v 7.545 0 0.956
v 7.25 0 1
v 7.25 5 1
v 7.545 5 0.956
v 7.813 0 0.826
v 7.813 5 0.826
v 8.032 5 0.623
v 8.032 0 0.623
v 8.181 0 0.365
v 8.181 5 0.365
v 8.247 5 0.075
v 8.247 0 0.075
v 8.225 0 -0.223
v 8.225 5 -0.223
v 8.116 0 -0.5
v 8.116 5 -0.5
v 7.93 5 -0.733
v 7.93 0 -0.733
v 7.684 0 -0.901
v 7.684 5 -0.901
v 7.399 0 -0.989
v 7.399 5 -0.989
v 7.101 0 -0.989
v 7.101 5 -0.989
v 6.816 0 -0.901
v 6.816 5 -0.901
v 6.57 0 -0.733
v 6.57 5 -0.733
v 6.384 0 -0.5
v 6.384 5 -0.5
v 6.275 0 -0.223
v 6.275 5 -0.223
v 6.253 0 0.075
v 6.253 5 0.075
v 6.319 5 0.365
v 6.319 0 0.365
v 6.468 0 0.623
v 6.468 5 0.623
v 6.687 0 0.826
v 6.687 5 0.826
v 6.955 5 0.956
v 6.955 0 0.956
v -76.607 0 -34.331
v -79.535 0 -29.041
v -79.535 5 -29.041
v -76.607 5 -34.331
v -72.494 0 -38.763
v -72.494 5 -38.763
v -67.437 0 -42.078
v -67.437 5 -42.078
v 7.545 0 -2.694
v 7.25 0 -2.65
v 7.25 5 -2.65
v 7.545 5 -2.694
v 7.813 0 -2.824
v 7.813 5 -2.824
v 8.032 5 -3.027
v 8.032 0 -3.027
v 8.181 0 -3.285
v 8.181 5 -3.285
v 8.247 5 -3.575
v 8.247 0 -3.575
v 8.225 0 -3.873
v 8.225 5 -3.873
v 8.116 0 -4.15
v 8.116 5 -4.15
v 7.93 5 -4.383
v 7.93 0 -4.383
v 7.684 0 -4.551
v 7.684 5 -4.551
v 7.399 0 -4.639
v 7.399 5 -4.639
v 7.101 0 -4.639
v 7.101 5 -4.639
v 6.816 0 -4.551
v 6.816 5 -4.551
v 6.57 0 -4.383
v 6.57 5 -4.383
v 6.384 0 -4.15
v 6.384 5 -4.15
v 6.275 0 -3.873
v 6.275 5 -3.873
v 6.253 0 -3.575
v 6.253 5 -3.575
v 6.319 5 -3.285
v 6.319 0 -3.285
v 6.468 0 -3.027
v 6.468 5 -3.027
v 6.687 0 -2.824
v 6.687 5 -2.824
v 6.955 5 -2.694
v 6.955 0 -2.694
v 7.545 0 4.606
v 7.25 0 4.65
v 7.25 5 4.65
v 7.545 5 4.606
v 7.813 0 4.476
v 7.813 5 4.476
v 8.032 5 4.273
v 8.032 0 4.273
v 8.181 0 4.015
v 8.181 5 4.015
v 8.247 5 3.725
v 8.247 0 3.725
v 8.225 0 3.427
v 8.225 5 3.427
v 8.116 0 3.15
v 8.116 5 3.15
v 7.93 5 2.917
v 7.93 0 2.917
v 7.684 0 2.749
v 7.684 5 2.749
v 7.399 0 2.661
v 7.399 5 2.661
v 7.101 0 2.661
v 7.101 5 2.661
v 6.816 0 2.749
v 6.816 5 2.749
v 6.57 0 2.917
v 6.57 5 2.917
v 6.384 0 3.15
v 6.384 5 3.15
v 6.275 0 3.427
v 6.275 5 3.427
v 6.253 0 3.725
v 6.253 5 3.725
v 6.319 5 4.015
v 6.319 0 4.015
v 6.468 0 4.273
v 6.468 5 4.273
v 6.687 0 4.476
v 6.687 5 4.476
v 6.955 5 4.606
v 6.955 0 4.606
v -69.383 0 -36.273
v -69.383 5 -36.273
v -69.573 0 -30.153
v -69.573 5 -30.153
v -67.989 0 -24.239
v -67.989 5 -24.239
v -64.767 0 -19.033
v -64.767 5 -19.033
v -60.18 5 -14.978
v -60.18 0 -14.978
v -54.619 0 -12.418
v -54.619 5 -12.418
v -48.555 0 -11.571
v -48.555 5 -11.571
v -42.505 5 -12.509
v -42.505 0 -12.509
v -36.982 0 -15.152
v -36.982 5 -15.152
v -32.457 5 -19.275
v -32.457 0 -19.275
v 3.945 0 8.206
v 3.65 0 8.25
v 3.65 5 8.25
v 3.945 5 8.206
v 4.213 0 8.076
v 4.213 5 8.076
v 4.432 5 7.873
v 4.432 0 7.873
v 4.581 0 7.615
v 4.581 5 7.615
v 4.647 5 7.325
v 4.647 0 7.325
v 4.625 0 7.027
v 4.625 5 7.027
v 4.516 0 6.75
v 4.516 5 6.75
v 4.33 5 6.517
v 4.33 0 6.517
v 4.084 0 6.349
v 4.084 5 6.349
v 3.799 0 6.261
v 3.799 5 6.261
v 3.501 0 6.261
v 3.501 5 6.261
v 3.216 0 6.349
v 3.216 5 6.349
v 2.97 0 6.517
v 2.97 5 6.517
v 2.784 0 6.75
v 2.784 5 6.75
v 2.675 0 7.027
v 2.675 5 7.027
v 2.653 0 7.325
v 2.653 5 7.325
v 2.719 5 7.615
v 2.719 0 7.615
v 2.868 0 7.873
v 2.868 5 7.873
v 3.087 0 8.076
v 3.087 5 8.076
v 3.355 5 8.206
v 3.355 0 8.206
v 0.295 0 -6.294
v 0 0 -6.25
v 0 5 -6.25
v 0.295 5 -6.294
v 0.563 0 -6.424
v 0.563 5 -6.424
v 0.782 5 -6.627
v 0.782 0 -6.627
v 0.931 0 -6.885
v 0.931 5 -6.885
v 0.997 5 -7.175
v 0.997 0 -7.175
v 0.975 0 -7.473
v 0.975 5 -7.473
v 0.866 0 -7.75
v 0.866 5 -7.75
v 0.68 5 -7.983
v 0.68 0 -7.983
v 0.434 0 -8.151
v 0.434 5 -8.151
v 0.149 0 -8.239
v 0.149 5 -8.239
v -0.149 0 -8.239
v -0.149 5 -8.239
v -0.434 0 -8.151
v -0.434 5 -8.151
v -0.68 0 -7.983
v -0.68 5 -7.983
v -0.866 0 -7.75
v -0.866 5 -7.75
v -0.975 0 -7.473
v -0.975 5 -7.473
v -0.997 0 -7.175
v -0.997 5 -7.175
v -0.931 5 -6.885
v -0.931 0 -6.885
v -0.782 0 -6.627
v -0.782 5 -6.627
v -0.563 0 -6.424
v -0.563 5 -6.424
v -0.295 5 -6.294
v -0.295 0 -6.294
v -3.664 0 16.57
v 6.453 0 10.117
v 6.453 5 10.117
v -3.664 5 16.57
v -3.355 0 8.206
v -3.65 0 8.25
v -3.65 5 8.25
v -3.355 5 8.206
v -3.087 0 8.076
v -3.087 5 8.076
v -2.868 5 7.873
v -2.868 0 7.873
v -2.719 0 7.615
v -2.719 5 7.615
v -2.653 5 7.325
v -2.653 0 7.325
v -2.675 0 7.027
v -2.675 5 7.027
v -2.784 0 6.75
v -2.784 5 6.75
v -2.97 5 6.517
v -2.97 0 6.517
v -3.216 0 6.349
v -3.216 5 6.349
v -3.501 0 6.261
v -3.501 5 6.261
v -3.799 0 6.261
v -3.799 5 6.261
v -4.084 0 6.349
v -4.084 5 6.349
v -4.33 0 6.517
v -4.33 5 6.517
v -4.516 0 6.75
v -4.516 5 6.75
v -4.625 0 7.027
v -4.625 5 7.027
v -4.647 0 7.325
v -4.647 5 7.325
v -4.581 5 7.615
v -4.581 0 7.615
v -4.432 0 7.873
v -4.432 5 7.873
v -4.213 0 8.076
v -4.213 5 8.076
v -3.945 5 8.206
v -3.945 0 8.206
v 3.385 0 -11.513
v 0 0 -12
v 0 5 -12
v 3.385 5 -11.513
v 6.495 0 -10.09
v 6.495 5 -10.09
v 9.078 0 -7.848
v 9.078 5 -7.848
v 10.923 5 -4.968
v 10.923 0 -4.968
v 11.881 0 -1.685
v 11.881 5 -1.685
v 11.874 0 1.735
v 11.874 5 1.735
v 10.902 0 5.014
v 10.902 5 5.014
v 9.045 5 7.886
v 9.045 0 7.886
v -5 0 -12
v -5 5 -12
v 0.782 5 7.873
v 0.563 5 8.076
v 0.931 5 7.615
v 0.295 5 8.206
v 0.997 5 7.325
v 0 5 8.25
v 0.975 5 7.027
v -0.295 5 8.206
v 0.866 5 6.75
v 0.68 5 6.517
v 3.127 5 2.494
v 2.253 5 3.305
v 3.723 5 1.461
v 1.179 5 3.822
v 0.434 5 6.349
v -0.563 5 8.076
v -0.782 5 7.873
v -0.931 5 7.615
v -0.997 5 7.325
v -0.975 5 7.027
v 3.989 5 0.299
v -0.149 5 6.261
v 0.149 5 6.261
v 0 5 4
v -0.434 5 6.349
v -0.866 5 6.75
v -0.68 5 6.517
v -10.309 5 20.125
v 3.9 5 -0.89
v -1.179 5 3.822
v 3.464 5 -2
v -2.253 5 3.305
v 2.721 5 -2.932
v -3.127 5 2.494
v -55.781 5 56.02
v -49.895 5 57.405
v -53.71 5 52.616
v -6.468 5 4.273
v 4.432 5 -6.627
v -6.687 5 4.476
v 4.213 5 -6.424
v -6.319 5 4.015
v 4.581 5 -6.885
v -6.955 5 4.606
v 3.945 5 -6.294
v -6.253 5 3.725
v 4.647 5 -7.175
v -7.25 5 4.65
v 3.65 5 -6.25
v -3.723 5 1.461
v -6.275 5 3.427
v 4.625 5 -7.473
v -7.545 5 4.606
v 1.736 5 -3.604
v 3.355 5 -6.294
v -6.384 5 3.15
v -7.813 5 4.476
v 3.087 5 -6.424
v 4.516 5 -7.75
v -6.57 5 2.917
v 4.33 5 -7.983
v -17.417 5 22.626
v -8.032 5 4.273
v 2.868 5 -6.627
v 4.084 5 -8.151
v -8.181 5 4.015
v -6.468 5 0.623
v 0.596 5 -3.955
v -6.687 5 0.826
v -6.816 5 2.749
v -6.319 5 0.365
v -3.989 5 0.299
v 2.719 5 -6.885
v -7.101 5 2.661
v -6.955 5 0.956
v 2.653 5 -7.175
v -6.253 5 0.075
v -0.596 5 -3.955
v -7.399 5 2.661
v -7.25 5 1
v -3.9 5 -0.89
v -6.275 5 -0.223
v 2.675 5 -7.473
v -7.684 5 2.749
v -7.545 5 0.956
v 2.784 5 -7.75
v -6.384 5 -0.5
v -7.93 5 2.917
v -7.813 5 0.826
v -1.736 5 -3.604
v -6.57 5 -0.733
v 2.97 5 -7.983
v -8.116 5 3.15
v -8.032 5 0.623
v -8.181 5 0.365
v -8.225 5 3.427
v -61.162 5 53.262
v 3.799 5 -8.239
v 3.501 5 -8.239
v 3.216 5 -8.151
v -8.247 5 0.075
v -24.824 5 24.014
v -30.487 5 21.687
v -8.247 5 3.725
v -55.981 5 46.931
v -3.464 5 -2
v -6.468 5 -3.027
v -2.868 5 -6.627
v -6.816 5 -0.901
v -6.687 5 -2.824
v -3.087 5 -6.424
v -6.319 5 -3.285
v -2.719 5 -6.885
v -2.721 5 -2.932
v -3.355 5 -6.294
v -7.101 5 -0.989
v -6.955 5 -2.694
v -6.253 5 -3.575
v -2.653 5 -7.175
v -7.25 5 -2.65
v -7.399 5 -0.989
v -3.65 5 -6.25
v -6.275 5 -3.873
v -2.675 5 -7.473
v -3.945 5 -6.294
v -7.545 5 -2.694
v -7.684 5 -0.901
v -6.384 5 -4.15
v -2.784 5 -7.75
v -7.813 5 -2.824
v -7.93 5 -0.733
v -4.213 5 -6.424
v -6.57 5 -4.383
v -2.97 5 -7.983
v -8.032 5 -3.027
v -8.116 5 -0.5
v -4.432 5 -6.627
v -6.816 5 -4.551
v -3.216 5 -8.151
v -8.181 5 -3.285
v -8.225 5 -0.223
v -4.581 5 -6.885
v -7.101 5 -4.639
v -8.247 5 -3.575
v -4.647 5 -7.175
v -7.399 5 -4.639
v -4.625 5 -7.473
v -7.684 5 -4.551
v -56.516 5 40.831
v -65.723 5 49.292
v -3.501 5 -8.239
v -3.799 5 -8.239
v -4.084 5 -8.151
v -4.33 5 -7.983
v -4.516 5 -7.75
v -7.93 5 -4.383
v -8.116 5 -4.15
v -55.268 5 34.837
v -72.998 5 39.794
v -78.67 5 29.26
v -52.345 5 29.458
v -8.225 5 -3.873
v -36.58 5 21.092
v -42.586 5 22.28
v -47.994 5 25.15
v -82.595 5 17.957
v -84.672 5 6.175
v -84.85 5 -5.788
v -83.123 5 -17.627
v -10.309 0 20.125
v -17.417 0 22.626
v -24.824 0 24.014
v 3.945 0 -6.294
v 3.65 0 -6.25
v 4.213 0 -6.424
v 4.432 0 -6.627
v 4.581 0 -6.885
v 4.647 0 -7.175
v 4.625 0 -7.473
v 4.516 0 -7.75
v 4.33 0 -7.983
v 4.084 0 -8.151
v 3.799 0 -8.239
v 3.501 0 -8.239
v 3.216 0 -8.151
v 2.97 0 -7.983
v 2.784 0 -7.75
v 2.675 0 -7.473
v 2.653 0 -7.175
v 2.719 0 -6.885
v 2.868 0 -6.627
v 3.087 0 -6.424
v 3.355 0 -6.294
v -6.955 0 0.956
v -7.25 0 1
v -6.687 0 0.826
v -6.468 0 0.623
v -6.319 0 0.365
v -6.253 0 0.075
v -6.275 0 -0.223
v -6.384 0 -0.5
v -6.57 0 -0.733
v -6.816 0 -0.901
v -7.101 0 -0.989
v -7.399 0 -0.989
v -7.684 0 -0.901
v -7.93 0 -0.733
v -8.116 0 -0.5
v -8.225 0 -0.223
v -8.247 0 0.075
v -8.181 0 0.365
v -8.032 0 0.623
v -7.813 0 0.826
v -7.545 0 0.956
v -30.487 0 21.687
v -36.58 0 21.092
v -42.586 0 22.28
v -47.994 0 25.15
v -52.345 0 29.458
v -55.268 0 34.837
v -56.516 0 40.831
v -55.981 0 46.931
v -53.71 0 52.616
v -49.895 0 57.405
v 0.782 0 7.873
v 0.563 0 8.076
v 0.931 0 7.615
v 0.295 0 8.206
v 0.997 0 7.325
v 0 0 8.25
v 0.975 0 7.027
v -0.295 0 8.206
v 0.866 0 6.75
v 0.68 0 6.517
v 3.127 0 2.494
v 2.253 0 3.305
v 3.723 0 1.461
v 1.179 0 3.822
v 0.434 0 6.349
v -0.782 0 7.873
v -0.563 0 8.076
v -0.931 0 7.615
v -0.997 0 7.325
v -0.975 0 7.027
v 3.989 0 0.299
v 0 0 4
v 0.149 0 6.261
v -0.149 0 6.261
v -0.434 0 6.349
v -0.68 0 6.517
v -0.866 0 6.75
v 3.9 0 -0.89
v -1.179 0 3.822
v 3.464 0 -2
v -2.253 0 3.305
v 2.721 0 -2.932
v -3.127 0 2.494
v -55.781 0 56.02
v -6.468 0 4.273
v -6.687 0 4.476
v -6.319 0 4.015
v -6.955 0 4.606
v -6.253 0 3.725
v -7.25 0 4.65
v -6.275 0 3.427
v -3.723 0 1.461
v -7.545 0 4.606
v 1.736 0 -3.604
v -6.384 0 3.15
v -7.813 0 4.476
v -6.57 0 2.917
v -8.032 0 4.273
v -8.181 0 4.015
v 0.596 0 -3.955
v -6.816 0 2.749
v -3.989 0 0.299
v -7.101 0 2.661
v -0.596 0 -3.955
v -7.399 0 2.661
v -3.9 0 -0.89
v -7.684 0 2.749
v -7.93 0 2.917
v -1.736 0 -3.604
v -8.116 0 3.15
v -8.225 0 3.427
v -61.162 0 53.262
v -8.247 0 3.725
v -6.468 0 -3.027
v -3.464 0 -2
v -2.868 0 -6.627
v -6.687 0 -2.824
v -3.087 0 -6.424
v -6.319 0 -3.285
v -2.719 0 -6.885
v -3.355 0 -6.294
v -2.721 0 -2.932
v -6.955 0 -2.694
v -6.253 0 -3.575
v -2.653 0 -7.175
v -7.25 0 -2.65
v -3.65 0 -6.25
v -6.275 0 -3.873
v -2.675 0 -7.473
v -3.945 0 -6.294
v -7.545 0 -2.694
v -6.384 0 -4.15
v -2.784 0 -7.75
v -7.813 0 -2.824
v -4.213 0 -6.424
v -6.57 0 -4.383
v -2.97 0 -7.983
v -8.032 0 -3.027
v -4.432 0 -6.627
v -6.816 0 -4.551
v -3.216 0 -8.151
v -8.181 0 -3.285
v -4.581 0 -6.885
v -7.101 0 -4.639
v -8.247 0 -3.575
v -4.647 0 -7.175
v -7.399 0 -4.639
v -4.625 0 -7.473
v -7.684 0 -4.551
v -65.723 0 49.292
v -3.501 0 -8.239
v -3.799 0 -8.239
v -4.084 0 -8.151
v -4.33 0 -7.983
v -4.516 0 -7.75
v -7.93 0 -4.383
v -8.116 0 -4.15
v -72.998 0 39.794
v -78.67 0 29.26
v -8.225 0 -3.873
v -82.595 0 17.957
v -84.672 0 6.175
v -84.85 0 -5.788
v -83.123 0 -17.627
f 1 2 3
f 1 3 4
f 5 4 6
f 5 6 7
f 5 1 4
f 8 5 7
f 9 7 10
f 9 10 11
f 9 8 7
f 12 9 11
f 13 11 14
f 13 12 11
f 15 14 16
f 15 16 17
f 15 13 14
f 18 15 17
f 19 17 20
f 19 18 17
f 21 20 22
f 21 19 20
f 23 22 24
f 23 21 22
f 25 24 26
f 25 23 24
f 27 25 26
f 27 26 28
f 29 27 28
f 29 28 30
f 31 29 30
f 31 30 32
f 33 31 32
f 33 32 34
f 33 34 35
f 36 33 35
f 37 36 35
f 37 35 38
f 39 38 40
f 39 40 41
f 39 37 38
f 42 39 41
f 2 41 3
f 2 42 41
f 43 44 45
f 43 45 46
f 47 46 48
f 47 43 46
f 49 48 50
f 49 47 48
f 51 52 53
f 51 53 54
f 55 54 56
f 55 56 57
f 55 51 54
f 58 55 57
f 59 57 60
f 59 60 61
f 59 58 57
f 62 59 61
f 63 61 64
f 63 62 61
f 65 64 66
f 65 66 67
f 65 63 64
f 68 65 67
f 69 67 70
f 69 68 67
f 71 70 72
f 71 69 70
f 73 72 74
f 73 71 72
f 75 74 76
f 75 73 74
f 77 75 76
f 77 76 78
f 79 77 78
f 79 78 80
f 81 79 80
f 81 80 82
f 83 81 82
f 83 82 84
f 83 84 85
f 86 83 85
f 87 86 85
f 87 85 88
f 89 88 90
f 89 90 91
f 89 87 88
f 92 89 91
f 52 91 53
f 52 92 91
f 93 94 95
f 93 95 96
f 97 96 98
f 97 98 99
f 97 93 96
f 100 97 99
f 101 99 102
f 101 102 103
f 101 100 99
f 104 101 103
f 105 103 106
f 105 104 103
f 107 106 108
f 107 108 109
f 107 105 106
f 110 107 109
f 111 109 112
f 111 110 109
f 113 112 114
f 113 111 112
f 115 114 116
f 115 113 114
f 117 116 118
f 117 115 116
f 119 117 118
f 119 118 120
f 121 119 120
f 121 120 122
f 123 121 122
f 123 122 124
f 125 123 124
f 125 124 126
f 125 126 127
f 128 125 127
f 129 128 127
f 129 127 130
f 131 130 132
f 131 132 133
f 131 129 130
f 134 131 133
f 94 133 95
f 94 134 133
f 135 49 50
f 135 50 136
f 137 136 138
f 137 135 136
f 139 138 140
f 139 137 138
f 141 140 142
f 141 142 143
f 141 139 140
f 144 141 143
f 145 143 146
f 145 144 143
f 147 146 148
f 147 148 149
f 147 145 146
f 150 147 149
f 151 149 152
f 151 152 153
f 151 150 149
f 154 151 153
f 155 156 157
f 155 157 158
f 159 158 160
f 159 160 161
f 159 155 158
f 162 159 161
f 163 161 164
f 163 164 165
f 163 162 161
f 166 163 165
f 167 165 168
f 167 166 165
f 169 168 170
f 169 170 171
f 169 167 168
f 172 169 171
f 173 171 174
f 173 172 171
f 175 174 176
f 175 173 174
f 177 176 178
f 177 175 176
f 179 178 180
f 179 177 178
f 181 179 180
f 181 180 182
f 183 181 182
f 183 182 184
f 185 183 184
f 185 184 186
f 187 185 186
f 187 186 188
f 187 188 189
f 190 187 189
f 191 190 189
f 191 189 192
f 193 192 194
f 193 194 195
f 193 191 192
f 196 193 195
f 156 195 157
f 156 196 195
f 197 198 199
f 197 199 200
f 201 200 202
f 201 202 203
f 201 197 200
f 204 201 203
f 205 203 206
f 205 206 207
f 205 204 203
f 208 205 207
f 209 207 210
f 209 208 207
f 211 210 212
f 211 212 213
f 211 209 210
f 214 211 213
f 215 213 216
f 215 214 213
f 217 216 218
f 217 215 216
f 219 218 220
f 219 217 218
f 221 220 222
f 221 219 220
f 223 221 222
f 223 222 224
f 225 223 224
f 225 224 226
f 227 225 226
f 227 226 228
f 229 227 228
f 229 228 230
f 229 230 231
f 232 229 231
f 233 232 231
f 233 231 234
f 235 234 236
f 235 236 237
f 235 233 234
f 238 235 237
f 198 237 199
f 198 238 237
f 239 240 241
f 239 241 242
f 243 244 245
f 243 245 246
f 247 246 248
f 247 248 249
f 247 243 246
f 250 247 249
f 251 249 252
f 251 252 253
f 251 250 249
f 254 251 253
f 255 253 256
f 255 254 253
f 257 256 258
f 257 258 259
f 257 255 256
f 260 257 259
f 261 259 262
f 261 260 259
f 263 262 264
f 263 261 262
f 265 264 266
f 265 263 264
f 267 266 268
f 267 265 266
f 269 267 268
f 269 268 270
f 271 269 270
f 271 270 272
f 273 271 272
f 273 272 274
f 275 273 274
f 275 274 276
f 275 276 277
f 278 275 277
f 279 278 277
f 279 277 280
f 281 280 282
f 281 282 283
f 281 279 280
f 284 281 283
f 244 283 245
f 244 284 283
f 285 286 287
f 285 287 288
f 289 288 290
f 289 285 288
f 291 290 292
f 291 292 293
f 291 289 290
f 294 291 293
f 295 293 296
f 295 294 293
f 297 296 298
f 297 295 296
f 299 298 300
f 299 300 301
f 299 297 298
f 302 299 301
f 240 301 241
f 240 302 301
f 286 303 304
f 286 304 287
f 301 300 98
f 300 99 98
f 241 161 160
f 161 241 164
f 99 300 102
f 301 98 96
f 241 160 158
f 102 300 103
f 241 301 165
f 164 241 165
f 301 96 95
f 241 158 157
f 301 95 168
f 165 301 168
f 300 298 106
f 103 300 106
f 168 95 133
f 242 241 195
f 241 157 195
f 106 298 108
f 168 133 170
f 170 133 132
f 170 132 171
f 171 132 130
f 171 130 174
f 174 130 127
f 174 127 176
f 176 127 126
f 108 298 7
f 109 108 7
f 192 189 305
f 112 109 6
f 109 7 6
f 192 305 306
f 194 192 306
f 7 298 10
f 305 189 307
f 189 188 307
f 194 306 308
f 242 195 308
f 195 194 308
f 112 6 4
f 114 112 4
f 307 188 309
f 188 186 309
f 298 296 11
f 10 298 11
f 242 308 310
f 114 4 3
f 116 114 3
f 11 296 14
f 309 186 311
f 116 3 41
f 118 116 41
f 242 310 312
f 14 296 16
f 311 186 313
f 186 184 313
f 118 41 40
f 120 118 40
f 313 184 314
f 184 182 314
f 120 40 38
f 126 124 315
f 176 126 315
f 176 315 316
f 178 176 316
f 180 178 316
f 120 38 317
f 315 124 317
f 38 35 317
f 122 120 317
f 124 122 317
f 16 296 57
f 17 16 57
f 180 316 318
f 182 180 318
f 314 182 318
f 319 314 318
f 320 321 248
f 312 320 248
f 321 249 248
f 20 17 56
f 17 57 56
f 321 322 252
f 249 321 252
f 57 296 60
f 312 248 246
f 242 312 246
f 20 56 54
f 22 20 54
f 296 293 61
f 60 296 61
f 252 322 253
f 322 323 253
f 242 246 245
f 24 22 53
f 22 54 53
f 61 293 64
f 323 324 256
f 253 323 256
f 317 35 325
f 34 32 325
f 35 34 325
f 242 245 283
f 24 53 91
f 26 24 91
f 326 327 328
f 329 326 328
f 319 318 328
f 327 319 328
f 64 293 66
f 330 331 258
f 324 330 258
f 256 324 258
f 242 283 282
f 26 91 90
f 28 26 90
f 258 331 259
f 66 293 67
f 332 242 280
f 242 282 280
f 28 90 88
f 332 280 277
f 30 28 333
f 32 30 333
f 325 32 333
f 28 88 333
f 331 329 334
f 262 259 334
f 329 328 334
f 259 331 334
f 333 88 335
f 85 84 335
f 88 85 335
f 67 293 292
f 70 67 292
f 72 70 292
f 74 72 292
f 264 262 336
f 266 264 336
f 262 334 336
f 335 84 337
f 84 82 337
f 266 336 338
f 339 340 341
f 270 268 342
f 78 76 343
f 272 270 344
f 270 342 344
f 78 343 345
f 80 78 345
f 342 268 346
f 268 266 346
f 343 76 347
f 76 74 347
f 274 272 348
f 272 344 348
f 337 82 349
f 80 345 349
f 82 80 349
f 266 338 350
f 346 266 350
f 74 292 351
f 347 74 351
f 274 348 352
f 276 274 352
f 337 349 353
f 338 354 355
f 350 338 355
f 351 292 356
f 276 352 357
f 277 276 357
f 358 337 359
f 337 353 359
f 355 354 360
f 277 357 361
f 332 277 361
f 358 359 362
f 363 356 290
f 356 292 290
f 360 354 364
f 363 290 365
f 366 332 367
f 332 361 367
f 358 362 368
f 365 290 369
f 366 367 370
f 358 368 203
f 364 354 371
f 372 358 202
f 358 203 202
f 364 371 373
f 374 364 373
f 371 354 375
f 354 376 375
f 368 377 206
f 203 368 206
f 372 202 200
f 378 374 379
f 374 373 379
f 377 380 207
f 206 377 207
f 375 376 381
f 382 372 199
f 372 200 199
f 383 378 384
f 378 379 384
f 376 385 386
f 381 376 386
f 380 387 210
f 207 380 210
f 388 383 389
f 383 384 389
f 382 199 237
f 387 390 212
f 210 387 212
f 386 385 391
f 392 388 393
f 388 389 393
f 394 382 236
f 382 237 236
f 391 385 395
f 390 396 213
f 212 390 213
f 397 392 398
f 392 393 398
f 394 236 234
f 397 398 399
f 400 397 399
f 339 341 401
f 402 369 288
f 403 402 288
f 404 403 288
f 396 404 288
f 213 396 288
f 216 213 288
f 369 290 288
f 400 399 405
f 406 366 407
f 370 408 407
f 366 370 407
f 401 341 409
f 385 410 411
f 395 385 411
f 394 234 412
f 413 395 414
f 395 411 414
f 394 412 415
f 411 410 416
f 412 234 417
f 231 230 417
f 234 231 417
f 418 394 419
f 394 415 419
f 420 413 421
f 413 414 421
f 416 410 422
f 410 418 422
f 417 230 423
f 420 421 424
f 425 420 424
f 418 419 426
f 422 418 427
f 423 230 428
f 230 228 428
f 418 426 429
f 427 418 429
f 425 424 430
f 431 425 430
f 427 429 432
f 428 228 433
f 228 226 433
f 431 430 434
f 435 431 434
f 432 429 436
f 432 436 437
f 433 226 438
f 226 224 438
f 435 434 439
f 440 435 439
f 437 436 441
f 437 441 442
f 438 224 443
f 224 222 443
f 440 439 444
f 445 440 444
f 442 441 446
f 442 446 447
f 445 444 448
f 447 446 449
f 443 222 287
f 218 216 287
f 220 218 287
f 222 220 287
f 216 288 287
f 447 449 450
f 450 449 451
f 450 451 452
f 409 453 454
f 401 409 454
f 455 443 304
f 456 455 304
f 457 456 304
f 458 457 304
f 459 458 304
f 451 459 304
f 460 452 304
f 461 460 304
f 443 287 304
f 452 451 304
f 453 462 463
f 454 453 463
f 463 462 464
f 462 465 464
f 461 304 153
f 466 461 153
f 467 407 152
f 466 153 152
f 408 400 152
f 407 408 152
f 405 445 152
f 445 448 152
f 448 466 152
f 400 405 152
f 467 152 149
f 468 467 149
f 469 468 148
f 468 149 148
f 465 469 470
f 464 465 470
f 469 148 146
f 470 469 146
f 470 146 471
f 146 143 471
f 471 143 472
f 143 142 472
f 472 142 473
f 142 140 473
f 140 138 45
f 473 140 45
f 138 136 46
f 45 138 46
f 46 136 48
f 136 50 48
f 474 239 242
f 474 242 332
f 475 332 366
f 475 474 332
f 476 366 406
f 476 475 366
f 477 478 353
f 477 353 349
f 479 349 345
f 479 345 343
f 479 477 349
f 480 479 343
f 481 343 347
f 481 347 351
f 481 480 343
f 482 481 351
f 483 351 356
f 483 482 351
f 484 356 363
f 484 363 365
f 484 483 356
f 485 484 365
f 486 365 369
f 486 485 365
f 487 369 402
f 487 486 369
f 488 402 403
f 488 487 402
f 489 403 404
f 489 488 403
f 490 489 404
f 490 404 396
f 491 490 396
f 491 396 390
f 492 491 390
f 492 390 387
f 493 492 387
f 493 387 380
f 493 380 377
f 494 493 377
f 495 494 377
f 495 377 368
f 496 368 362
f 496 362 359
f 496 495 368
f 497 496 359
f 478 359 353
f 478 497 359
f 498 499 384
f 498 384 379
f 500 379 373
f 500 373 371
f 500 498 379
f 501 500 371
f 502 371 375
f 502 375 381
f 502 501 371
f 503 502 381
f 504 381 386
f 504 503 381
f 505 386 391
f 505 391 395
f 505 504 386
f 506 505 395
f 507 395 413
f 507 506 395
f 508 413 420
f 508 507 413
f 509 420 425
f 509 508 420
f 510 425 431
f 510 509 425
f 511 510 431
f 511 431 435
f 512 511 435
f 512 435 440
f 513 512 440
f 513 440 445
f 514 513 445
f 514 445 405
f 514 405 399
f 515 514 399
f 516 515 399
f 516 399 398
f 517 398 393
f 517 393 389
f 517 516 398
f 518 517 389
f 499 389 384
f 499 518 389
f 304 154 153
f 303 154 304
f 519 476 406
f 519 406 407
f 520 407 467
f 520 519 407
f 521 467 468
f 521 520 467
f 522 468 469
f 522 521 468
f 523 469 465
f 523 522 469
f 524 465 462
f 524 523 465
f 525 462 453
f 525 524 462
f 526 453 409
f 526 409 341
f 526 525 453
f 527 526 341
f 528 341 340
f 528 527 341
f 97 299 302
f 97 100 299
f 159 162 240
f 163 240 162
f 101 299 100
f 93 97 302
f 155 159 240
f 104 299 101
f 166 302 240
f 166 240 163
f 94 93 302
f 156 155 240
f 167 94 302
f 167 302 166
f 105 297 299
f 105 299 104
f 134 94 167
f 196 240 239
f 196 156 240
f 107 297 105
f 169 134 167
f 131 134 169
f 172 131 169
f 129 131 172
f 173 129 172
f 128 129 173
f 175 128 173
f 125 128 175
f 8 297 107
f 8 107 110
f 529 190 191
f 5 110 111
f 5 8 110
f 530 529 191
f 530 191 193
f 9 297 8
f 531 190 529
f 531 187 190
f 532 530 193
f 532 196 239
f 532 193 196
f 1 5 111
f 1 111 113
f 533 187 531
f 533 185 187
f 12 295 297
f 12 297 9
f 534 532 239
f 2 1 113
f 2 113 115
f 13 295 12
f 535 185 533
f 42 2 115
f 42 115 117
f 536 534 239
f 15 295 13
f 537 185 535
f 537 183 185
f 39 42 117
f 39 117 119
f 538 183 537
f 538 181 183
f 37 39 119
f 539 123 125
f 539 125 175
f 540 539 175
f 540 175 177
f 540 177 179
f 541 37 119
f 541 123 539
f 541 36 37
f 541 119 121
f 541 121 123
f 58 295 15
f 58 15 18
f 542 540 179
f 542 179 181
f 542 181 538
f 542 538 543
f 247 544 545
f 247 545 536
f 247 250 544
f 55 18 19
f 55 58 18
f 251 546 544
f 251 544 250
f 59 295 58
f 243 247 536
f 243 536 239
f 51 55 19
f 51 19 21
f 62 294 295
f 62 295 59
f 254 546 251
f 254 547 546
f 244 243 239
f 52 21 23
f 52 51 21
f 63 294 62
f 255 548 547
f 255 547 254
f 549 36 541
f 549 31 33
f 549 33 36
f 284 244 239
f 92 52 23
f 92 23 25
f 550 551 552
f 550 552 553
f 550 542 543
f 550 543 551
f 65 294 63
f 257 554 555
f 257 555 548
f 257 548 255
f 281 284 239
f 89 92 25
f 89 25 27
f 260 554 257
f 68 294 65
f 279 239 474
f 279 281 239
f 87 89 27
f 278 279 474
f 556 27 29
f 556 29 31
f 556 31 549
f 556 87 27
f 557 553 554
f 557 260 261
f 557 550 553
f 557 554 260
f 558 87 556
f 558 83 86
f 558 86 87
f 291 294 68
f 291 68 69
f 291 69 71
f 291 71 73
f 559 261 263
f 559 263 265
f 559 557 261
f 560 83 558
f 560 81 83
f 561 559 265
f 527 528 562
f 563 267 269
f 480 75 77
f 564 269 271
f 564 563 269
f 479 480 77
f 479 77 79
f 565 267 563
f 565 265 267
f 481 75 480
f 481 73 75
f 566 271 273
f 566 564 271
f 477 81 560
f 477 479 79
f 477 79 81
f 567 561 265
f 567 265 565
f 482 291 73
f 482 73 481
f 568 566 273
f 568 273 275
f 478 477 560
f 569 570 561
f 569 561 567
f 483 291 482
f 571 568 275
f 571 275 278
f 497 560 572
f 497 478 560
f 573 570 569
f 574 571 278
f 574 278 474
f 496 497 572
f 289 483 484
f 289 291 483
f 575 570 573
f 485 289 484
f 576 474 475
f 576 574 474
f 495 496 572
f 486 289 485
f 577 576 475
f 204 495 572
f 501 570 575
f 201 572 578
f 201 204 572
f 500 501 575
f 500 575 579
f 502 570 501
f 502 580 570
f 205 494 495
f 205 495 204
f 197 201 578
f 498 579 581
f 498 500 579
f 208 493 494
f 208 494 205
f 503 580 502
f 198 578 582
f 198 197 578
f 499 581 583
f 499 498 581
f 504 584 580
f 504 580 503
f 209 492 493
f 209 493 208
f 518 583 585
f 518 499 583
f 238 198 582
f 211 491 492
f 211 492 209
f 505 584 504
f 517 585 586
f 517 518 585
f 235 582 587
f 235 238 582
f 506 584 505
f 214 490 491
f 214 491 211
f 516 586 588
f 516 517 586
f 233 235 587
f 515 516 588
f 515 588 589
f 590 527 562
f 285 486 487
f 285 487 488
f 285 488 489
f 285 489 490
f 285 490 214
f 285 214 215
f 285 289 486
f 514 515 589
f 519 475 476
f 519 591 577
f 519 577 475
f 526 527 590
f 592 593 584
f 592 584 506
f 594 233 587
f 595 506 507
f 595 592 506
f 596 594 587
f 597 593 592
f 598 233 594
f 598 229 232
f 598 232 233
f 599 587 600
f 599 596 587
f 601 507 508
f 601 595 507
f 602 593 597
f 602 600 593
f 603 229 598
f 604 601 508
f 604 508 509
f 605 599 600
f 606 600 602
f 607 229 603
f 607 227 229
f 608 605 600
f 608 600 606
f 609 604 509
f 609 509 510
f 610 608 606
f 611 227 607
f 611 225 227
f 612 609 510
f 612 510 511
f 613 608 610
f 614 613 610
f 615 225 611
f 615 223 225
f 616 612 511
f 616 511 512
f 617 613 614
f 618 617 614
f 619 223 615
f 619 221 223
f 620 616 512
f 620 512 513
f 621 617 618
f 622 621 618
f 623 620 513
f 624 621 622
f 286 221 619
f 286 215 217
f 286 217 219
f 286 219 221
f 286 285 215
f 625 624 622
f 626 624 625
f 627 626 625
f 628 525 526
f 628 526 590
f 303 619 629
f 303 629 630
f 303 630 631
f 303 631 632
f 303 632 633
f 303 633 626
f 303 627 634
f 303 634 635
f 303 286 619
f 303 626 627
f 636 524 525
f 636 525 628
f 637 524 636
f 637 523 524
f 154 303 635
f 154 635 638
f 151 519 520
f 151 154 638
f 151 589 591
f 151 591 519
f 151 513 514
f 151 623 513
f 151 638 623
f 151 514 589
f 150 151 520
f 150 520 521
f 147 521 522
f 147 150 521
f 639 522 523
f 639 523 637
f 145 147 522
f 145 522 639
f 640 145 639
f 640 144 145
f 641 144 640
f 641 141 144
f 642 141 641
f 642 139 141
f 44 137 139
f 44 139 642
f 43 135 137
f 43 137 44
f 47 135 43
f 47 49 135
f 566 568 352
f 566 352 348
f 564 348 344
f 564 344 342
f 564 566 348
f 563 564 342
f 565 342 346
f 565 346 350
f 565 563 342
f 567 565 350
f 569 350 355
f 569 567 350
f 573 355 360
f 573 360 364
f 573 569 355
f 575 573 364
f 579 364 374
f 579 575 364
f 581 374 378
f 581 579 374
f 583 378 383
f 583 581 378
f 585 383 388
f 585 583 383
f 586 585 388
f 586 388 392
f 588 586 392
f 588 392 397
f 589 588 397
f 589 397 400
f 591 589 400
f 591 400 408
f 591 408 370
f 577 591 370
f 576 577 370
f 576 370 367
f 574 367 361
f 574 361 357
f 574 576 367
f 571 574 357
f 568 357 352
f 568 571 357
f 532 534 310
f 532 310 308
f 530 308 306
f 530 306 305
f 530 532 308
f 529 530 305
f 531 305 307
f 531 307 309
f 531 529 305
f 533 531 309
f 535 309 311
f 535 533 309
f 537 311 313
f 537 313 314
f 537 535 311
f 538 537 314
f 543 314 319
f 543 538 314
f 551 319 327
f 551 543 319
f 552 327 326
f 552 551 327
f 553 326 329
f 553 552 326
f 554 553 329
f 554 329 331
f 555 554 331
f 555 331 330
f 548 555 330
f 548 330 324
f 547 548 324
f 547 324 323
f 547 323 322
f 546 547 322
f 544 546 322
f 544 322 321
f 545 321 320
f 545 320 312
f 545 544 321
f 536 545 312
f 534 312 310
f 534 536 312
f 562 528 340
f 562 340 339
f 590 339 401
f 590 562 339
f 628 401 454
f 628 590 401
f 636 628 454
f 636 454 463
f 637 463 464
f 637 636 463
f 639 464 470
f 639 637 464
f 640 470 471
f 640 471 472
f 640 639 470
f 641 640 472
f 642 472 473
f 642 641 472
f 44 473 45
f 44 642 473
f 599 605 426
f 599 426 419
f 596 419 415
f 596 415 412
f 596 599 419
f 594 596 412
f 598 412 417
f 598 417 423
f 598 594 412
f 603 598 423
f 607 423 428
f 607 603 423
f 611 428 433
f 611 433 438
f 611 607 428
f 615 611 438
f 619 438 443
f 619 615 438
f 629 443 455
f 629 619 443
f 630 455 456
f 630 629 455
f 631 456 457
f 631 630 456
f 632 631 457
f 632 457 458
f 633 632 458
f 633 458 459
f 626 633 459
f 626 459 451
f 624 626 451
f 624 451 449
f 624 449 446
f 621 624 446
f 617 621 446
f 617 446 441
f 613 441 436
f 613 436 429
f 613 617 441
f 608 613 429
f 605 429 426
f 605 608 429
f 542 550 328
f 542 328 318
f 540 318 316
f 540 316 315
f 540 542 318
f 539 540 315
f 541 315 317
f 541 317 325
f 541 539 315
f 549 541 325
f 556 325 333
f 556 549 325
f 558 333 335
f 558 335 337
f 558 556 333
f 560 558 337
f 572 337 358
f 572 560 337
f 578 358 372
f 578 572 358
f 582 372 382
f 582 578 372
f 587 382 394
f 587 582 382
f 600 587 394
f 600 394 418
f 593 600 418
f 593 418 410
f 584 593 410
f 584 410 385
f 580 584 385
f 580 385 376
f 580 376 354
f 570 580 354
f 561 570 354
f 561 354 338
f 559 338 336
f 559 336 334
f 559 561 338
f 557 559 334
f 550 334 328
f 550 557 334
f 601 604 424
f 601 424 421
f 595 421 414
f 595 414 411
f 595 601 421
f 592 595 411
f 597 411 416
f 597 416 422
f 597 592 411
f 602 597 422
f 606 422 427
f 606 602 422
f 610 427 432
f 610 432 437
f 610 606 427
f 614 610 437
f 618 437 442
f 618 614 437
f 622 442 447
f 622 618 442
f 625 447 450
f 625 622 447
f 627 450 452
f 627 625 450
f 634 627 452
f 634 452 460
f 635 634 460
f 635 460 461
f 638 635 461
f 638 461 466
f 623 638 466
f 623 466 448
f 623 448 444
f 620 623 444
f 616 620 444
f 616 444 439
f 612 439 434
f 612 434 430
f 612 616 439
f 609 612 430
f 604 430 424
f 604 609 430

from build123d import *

# Parameters (mm, degrees)
ESQUISSE1_R        = 4
ESQUISSE1_R_2      = 1
BOSS_EXTRU_1_DEPTH = 5


with BuildPart() as part:
    # Esquisse1 → Boss.-Extru.1 (new body)
    with BuildSketch(Plane(origin=(0, 0, 0), x_dir=(1, 0, 0), z_dir=(0, 1, 0))):
        with BuildLine():
            Line((-32.45676656, 19.27541283), (-5, 12))
            Line((-5, 12), (0, 12))
            ThreePointArc((0, 12), (11.519722281, 3.360952031), (6.452872334, -10.117333574))
            Line((6.452872334, -10.117333574), (-3.66446124, -16.570205908))
            ThreePointArc((-3.66446124, -16.570205908), (-13.815132068, -21.511376537), (-24.82365287, -24.014126066))
            ThreePointArc((-24.82365287, -24.014126066), (-52.345095334, -29.457799684), (-49.895398662, -57.405292665))
            ThreePointArc((-49.895398662, -57.405292665), (-58.555043799, -54.803988162), (-65.722985518, -49.292468357))
            ThreePointArc((-65.722985518, -49.292468357), (-83.868971565, -12.107677443), (-79.535269898, 29.040888933))
            ThreePointArc((-79.535269898, 29.040888933), (-74.684658752, 36.671603877), (-67.436952657, 42.077803594))
            ThreePointArc((-67.436952657, 42.077803594), (-60.180308988, 14.977905063), (-32.45676656, 19.27541283))
        make_face()
        with Locations(Location((0, 0, 0), (0, 0, 270))):
            Circle(ESQUISSE1_R, mode=Mode.SUBTRACT)
        with Locations(Location((7.25, -3.65, 0), (0, 0, 270))):
            Circle(ESQUISSE1_R_2, mode=Mode.SUBTRACT)
        with Locations(Location((7.25, 0, 0), (0, 0, 270))):
            Circle(ESQUISSE1_R_2, mode=Mode.SUBTRACT)
        with Locations(Location((7.25, 3.65, 0), (0, 0, 270))):
            Circle(ESQUISSE1_R_2, mode=Mode.SUBTRACT)
        with Locations(Location((3.65, -7.25, 0), (0, 0, 270))):
            Circle(ESQUISSE1_R_2, mode=Mode.SUBTRACT)
        with Locations(Location((0, -7.25, 0), (0, 0, 270))):
            Circle(ESQUISSE1_R_2, mode=Mode.SUBTRACT)
        with Locations(Location((-3.65, -7.25, 0), (0, 0, 270))):
            Circle(ESQUISSE1_R_2, mode=Mode.SUBTRACT)
        with Locations(Location((-7.25, -3.65, 0), (0, 0, 270))):
            Circle(ESQUISSE1_R_2, mode=Mode.SUBTRACT)
        with Locations(Location((-7.25, 0, 0), (0, 0, 270))):
            Circle(ESQUISSE1_R_2, mode=Mode.SUBTRACT)
        with Locations(Location((-7.25, 3.65, 0), (0, 0, 270))):
            Circle(ESQUISSE1_R_2, mode=Mode.SUBTRACT)
        with Locations(Location((-3.65, 7.25, 0), (0, 0, 270))):
            Circle(ESQUISSE1_R_2, mode=Mode.SUBTRACT)
        with Locations(Location((0, 7.25, 0), (0, 0, 270))):
            Circle(ESQUISSE1_R_2, mode=Mode.SUBTRACT)
        with Locations(Location((3.65, 7.25, 0), (0, 0, 270))):
            Circle(ESQUISSE1_R_2, mode=Mode.SUBTRACT)
    extrude(amount=BOSS_EXTRU_1_DEPTH)


solid = part.part
